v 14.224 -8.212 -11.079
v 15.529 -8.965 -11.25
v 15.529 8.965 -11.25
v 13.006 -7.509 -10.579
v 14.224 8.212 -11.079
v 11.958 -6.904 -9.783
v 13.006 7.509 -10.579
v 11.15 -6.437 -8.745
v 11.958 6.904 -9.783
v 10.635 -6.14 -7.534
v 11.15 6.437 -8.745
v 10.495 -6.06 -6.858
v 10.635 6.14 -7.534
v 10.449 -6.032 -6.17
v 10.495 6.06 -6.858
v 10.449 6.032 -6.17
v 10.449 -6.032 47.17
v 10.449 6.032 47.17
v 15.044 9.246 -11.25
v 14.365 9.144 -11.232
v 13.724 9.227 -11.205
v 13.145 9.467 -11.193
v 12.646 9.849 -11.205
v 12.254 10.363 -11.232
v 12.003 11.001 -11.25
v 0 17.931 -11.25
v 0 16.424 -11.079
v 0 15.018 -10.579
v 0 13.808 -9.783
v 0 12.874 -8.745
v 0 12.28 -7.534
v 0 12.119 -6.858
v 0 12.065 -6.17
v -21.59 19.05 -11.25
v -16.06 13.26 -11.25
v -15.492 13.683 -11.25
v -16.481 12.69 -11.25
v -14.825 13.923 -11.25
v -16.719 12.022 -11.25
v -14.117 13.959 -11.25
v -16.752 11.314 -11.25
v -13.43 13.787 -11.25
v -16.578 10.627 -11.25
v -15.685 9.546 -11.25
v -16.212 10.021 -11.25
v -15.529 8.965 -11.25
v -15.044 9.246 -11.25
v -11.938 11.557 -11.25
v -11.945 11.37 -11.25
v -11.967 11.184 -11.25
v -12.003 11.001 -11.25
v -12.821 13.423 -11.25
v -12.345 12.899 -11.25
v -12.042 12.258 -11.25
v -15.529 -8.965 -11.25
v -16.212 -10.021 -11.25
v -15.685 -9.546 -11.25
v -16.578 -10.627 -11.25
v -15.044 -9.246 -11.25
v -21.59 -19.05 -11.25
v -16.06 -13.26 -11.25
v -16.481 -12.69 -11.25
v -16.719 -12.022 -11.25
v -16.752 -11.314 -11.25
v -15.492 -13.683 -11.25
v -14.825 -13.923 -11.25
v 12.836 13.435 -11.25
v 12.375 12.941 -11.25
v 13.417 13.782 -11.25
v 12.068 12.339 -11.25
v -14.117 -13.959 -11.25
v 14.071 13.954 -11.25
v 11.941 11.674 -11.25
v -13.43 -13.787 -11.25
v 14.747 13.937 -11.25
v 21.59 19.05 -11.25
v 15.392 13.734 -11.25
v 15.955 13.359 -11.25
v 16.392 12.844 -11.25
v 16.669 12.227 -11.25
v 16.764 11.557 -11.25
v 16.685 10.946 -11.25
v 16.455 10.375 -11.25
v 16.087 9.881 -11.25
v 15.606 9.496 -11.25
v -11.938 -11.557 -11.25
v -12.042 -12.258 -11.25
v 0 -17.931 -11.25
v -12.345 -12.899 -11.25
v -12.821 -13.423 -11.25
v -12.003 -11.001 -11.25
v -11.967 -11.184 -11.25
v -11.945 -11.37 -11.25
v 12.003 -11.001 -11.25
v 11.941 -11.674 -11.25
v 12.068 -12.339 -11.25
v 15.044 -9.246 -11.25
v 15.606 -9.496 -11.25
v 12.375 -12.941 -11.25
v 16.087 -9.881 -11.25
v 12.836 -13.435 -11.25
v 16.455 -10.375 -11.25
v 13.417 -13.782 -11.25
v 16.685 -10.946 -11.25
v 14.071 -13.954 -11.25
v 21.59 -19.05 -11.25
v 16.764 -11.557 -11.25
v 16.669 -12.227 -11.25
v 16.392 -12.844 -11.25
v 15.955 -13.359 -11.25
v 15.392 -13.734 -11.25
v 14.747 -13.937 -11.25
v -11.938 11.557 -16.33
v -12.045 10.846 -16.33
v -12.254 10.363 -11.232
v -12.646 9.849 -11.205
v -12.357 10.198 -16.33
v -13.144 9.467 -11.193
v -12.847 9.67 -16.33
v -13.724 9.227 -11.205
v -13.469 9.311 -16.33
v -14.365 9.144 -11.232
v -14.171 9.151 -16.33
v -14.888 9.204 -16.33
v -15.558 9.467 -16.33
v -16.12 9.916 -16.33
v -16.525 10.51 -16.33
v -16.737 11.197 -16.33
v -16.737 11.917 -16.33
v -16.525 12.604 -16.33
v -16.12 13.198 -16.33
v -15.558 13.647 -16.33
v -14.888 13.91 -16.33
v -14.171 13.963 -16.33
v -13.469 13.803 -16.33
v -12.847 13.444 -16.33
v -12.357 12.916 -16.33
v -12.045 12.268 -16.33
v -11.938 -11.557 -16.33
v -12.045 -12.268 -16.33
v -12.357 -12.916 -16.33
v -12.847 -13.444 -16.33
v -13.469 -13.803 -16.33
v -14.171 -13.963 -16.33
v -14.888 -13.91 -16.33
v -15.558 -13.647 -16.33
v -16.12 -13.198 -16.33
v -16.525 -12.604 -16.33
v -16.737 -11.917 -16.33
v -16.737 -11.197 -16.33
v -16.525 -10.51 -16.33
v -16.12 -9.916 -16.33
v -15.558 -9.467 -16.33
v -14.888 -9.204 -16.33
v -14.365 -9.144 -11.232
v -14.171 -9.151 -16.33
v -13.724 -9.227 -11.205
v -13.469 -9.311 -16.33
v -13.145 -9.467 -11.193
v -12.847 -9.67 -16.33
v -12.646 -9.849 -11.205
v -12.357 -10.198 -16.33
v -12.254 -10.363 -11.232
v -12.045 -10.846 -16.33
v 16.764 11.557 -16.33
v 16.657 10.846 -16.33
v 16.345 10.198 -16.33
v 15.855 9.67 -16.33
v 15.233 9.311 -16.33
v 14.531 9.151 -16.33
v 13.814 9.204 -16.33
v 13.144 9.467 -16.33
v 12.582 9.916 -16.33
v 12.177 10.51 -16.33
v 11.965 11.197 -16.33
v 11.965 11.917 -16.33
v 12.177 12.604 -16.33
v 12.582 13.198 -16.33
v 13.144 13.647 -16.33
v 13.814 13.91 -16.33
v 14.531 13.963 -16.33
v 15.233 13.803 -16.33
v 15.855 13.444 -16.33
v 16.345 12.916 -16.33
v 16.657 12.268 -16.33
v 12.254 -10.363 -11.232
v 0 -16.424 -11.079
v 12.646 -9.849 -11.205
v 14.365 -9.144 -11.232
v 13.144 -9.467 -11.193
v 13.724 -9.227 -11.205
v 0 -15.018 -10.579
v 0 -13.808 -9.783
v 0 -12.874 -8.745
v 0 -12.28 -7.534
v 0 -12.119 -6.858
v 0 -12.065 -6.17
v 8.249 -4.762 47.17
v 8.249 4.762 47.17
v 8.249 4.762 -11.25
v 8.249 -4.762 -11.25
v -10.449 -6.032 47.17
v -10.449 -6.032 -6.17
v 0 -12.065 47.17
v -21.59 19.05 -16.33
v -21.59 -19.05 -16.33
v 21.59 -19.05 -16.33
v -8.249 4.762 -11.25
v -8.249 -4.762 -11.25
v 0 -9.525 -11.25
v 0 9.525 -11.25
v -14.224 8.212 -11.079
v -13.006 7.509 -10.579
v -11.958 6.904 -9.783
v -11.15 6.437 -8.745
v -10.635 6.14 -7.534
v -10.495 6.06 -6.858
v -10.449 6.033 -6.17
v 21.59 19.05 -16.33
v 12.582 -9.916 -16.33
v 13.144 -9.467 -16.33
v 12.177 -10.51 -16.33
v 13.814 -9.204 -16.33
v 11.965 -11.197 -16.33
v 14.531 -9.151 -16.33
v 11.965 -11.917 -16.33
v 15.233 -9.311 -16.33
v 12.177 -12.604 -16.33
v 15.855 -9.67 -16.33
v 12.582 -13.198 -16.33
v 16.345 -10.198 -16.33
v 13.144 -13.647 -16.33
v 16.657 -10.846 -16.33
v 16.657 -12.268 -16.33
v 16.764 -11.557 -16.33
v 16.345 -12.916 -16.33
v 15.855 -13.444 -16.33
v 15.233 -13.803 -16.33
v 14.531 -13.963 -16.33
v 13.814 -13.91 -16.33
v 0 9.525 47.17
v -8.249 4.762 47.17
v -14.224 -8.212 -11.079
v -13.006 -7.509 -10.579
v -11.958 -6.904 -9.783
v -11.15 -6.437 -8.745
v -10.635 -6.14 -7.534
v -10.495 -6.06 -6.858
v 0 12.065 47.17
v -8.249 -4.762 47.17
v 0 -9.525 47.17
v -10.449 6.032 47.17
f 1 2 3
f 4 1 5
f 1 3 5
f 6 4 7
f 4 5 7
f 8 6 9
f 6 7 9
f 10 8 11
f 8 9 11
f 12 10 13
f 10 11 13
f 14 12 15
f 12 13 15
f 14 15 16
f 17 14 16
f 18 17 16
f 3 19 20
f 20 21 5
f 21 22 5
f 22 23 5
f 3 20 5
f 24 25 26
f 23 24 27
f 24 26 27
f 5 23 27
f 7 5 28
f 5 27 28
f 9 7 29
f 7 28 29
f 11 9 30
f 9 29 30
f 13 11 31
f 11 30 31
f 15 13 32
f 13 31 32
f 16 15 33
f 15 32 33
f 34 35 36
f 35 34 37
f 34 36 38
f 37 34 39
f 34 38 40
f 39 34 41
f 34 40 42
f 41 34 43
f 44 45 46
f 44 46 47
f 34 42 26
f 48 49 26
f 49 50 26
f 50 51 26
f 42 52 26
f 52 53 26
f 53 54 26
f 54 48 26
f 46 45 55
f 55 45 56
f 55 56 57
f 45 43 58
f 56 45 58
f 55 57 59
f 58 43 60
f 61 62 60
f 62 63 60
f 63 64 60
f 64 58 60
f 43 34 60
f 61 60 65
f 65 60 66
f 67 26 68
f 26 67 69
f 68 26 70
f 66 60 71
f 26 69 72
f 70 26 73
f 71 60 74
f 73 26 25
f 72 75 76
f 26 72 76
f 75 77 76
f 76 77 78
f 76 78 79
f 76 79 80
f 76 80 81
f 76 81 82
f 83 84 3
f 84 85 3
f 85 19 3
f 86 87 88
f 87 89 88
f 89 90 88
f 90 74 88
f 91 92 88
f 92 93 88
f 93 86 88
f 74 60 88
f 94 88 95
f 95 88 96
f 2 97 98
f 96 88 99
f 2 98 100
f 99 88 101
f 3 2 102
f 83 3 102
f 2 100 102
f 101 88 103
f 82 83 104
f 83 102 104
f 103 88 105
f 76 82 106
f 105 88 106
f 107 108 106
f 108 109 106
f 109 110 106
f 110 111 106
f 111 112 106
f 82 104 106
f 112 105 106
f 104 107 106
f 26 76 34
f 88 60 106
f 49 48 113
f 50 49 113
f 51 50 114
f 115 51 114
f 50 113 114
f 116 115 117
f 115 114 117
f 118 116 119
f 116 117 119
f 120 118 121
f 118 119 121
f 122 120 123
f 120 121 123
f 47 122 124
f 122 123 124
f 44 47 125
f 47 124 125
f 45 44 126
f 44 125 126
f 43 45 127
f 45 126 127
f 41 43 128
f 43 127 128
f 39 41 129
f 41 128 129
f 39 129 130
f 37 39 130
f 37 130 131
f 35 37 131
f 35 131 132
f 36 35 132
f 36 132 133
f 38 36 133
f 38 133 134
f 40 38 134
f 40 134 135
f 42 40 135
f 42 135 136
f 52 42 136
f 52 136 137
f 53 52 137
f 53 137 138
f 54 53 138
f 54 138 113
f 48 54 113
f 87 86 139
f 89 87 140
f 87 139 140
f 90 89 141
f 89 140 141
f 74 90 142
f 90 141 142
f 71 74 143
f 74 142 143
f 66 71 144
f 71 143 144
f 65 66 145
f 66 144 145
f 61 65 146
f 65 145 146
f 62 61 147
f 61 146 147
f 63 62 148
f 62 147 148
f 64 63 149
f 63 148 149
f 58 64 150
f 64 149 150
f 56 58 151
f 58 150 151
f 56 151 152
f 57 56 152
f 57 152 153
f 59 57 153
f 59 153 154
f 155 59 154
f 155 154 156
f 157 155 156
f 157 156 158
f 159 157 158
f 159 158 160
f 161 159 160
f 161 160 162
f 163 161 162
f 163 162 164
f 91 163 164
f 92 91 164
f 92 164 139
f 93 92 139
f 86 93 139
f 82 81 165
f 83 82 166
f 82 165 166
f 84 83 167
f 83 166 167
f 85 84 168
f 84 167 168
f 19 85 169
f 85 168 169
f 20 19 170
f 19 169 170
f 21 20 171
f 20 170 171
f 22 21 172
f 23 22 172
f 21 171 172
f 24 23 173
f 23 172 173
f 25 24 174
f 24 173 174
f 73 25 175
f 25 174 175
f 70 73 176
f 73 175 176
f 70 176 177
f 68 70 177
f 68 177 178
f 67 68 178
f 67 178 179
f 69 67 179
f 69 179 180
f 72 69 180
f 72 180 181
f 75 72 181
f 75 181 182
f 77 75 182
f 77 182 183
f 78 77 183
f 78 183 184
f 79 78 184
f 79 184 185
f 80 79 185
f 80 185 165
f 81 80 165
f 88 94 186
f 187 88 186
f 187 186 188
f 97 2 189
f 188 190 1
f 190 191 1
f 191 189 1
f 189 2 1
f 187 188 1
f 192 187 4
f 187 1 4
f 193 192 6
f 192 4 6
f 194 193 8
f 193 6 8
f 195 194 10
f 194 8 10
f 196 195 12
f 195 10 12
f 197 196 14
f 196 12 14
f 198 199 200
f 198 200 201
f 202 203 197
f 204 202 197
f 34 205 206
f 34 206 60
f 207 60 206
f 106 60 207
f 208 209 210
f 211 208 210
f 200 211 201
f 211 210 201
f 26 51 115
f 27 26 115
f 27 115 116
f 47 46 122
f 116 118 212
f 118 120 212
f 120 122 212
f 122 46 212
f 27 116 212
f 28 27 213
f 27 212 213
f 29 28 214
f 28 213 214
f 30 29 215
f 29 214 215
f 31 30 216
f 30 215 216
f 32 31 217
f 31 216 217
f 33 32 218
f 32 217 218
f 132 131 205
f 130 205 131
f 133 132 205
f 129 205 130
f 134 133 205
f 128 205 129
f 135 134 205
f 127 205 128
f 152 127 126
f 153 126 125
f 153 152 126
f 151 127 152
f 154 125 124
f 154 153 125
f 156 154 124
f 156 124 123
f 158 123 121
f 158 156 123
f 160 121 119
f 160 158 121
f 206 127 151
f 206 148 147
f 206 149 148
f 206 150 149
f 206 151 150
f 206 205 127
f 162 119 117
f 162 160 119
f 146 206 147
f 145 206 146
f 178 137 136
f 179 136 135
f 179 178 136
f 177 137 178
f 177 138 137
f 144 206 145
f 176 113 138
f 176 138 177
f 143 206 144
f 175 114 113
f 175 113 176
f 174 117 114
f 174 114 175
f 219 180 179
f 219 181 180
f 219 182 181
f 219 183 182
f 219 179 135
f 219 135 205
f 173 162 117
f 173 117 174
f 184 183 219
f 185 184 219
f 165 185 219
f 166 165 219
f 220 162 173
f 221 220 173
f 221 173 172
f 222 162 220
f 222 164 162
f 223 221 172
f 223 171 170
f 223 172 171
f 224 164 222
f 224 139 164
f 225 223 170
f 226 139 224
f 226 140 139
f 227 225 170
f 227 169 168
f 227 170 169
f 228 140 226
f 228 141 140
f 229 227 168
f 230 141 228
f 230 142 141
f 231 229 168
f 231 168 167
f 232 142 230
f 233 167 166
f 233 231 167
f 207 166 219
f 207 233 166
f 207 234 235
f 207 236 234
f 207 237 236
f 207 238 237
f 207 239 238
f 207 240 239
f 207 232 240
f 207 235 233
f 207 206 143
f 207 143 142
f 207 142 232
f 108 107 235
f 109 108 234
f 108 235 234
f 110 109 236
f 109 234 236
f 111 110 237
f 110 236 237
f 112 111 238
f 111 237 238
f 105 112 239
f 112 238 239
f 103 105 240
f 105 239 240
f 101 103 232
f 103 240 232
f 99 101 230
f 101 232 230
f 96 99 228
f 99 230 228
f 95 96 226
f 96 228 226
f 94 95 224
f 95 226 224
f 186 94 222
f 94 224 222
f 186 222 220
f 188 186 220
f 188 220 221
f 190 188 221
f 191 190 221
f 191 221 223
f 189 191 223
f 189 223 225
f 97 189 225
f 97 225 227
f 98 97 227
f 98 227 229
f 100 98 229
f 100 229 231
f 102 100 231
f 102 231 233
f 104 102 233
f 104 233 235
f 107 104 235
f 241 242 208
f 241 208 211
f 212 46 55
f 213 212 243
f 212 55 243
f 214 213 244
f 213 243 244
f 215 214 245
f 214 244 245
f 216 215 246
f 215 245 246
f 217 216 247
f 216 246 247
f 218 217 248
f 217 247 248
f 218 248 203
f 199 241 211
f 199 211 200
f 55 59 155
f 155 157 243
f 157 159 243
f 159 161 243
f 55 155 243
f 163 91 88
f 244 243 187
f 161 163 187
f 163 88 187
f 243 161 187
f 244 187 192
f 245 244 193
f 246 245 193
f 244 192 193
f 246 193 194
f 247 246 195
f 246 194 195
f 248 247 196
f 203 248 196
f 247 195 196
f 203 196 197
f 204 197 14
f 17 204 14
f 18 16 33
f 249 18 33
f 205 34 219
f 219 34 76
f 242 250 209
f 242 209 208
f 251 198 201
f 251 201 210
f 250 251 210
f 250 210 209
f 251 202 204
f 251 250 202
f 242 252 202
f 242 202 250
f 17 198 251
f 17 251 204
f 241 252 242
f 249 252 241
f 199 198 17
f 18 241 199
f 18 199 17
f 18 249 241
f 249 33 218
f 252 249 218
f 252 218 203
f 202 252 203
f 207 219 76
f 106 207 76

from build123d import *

# Parameters (mm, degrees)
F0_W     = 43.18
F0_H     = 5.08
F1_DEPTH = 19.05
F3_DEPTH = 58.42
F4_R     = 5.08
F5_R     = 2.413
F6_DEPTH = 25.4


with BuildPart() as f1:
    # F0 (on Front) → F1 (new body, symmetric)
    with BuildSketch(Plane.XZ):
        with Locations((0, -13.789871)):
            Rectangle(F0_W, F0_H)
    extrude(amount=F1_DEPTH, both=True)

    # F2 (on face) → F3 (join)
    with BuildSketch(Plane.XY.offset(-11.249871)):
        Polygon((10.448596, 6.0325), (0, 12.065), (-10.448596, 6.0325), (-10.448596, -6.0325), (0, -12.065), (10.448596, -6.0325), align=None)
        Polygon((-8.248892, 4.7625), (0, 9.525), (8.248892, 4.7625), (8.248892, -4.7625), (0, -9.525), (-8.248892, -4.7625), align=None, mode=Mode.SUBTRACT)
    extrude(amount=F3_DEPTH)

    # F4
    f4_edges = [f1.edges().sort_by_distance(p)[0] for p in [
        (10.448596, 0, -11.249871),
        (5.224298, -9.04875, -11.249871),
        (-5.224298, -9.04875, -11.249871),
        (5.224298, 9.04875, -11.249871),
        (-5.224298, 9.04875, -11.249871),
        (-10.448596, 0, -11.249871),
    ]]
    fillet(f4_edges, radius=F4_R)

    # F5 (on face) → F6 (cut)
    with BuildSketch(Plane(origin=(0, 0, -16.329871), x_dir=(1, 0, 0), z_dir=(0, 0, -1))):
        with Locations((-14.351, 11.557)):
            Circle(F5_R)
        with Locations((14.351, 11.557)):
            Circle(F5_R)
        with Locations((-14.351, -11.557)):
            Circle(F5_R)
        with Locations((14.351, -11.557)):
            Circle(F5_R)
    extrude(amount=-F6_DEPTH, mode=Mode.SUBTRACT)


solid = f1.part
